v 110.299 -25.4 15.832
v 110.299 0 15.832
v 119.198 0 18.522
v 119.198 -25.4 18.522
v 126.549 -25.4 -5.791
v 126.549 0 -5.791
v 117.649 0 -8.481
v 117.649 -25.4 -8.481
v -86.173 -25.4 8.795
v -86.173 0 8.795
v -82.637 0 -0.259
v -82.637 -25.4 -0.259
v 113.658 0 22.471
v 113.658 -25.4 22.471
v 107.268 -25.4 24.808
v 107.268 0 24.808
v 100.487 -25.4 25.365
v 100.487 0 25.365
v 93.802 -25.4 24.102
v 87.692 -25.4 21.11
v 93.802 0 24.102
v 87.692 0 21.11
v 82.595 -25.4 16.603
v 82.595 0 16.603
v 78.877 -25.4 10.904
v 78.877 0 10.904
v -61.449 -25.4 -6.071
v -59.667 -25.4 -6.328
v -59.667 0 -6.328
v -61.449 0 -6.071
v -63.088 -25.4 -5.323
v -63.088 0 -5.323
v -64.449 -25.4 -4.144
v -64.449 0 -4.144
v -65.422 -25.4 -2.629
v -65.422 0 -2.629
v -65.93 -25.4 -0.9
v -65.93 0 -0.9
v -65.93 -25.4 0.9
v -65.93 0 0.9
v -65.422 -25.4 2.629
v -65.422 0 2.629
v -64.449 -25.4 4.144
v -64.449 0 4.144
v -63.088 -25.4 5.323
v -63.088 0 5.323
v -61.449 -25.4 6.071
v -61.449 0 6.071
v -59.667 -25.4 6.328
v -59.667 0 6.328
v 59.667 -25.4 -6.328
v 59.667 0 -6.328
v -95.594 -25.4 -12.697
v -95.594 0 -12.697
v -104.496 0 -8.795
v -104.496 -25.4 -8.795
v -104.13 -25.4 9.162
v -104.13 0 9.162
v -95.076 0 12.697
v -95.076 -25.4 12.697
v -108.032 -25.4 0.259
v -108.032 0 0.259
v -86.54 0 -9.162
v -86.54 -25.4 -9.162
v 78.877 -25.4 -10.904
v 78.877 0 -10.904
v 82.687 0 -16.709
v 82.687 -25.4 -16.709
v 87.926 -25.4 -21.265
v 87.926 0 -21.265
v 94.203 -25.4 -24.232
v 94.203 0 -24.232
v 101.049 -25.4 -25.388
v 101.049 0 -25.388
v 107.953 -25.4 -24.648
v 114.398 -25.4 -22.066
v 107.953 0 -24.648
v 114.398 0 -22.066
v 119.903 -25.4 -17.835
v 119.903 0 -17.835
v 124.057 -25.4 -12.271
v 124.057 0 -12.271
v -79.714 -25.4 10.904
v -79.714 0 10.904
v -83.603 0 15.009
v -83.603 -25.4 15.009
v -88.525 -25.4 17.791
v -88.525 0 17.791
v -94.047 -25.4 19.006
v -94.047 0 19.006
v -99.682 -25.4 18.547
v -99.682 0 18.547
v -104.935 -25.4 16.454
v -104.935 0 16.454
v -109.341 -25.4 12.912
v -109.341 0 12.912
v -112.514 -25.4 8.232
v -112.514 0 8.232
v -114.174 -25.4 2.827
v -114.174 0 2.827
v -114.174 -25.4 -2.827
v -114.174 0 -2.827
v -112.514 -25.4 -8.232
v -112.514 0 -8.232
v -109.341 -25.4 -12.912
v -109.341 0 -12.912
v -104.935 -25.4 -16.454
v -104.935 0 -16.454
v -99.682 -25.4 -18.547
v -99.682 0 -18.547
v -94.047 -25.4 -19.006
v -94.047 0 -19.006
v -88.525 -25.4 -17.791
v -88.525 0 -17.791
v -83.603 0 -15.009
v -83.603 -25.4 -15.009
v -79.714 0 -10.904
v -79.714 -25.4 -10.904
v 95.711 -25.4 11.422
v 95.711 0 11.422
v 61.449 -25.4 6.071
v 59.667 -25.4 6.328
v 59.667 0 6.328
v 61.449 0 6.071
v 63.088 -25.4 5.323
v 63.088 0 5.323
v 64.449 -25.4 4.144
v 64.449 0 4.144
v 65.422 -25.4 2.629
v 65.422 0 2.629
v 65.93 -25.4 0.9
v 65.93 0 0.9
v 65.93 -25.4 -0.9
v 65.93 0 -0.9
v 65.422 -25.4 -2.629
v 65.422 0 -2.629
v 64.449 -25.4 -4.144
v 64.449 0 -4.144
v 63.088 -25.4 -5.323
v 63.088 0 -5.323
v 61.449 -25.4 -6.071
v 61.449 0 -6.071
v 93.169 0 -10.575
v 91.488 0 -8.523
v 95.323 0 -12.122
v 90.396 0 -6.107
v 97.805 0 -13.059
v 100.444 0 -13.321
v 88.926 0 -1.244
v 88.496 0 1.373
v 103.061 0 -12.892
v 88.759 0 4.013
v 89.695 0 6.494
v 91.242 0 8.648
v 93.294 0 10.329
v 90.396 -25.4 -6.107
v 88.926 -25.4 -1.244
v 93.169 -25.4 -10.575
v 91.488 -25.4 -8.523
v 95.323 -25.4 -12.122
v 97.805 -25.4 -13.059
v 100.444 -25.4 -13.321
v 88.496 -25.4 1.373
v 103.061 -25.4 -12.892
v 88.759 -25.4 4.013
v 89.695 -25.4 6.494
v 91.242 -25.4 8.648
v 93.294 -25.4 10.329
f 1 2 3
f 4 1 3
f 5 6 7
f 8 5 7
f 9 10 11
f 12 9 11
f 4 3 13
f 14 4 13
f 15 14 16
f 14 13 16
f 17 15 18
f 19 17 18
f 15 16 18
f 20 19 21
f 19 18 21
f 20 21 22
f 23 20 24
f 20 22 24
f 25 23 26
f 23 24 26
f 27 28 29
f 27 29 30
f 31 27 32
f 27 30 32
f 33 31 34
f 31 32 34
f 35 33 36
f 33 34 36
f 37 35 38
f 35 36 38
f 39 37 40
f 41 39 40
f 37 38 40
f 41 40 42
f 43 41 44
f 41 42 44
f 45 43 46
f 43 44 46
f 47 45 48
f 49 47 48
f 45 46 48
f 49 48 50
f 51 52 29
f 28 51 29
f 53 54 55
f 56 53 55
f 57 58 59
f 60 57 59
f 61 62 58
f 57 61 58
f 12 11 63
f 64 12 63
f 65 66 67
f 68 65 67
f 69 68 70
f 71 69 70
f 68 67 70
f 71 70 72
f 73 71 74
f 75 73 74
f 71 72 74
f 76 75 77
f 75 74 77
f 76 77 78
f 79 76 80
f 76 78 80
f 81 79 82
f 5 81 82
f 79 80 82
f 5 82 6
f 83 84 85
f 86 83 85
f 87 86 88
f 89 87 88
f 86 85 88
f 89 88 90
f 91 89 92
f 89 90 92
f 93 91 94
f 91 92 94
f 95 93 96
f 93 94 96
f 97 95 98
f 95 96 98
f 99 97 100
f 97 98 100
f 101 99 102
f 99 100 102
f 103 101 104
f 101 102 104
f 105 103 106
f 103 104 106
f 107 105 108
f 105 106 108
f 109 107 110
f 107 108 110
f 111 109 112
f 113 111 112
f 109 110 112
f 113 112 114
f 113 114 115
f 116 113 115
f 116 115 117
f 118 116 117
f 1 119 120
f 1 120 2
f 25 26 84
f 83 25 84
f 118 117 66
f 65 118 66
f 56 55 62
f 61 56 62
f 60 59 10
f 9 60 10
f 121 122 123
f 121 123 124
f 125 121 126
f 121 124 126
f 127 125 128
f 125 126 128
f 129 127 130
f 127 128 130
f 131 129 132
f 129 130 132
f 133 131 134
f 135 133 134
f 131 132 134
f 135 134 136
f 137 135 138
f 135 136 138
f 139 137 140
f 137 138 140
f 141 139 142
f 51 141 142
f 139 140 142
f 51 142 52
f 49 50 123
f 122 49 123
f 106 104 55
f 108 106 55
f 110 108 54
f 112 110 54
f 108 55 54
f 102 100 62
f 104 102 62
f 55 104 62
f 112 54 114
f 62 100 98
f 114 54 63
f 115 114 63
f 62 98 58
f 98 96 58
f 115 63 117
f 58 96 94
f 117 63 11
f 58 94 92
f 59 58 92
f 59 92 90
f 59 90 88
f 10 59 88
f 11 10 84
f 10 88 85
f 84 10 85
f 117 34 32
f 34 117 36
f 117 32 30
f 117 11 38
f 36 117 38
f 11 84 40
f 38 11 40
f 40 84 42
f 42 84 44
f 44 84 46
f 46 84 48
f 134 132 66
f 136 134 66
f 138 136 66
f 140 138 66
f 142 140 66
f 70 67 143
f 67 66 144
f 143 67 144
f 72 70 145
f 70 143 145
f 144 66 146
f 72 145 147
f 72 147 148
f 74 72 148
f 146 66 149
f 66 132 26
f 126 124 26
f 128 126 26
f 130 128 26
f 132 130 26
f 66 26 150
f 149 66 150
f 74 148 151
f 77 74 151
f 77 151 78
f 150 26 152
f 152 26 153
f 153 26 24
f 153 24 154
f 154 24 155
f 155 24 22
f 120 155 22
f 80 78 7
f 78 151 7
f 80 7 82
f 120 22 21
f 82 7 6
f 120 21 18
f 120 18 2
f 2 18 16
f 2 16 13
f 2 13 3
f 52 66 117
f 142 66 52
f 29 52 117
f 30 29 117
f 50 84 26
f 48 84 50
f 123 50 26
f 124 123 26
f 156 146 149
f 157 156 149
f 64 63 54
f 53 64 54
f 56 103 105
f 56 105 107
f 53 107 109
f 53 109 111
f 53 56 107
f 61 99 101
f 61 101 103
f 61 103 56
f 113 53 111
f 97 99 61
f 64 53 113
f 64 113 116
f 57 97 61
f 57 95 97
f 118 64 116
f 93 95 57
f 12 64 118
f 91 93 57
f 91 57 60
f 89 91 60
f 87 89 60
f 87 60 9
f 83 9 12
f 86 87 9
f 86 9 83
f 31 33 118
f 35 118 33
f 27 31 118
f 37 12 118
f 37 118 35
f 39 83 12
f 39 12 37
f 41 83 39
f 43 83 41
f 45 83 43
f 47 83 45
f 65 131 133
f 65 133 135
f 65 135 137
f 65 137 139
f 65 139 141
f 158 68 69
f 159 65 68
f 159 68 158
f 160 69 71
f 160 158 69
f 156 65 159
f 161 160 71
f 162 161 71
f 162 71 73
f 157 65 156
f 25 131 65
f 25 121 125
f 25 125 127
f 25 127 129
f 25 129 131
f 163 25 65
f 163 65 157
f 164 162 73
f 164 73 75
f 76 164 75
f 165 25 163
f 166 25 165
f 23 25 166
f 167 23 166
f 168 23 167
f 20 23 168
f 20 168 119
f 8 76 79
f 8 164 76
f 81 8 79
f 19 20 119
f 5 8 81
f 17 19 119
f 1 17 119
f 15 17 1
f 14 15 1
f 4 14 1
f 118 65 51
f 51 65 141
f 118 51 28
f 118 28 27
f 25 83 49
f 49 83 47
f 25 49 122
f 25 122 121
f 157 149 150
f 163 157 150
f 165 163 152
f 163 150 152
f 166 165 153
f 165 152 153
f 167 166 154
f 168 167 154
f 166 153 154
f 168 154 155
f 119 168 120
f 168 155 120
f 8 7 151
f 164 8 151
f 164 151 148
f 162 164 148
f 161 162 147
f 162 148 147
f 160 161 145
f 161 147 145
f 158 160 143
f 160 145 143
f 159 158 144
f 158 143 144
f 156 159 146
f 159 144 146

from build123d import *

# Parameters (mm, degrees)
F1_DEPTH = 25.4


# Not quite as in the source:
# - a feature of the source that left no trace in its solid (it failed there, or was rolled back) is left out


with BuildPart() as f1:
    # F0 (on Front) → F1 (new body)
    with BuildSketch(Plane.XZ):
        with BuildLine():
            ThreePointArc((-79.7143682919, -10.9044297796), (-77.1623604825, -5.7155262496), (-76.2847367633, 0))
            ThreePointArc((-76.2847367633, 0), (-77.1623604825, 5.7155262496), (-79.7143682919, 10.9044297796))
            ThreePointArc((-79.7143682919, 10.9044297796), (-114.3847367633, 0), (-79.7143682919, -10.9044297796))
        make_face()
        Polygon((-82.6373805848, -0.2591255978), (-86.5395795737, -9.1616161244), (-95.5938623611, -12.6973561785), (-104.4963528877, -8.7951571896), (-108.0320929418, 0.2591255978), (-104.1298939529, 9.1616161244), (-95.0756111655, 12.6973561785), (-86.1731206389, 8.7951571896), align=None, mode=Mode.SUBTRACT)
        with BuildLine():
            ThreePointArc((-79.7143682919, 10.9044297796), (-77.1623604825, 5.7155262496), (-76.2847367633, 0))
            ThreePointArc((-76.2847367633, 0), (-77.1623604825, -5.7155262496), (-79.7143682919, -10.9044297796))
            Line((-79.7143682919, -10.9044297796), (78.8772994949, -10.9044297796))
            ThreePointArc((78.8772994949, -10.9044297796), (76.4175133383, 0), (78.8772994949, 10.9044297796))
            Line((78.8772994949, 10.9044297796), (-79.7143682919, 10.9044297796))
        make_face()
        with BuildLine():
            ThreePointArc((-59.6665927425, -6.3275160443), (-65.9941087868, 0), (-59.6665927425, 6.3275160443))
            Line((-59.6665927425, 6.3275160443), (59.6665927425, 6.3275160443))
            ThreePointArc((59.6665927425, 6.3275160443), (65.9941087868, 0), (59.6665927425, -6.3275160443))
            Line((59.6665927425, -6.3275160443), (-59.6665927425, -6.3275160443))
        make_face(mode=Mode.SUBTRACT)
        with BuildLine():
            ThreePointArc((119.1980874489, 18.5223012497), (97.1020716916, 24.9584576863), (78.8772994949, 10.9044297796))
            ThreePointArc((78.8772994949, 10.9044297796), (76.4175133383, 0), (78.8772994949, -10.9044297796))
            ThreePointArc((78.8772994949, -10.9044297796), (104.5265574803, -25.2551198737), (126.5485838124, -5.7908680873))
            Line((126.5485838124, -5.7908680873), (117.6493461886, -8.4813364867))
            Line((117.6493461886, -8.4813364867), (103.0614445864, -12.8916343049))
            ThreePointArc((103.0614445864, -12.8916343049), (95.3234776063, -12.1222036637), (90.3959783062, -6.1065651155))
            Line((90.3959783062, -6.1065651155), (88.9258790335, -1.2439312481))
            ThreePointArc((88.9258790335, -1.2439312481), (89.6953096746, 6.494035732), (95.7109482229, 11.4215350322))
            Line((95.7109482229, 11.4215350322), (110.2988498251, 15.8318328503))
            Line((110.2988498251, 15.8318328503), (119.1980874489, 18.5223012497))
        make_face()
    extrude(amount=F1_DEPTH)


solid = f1.part
